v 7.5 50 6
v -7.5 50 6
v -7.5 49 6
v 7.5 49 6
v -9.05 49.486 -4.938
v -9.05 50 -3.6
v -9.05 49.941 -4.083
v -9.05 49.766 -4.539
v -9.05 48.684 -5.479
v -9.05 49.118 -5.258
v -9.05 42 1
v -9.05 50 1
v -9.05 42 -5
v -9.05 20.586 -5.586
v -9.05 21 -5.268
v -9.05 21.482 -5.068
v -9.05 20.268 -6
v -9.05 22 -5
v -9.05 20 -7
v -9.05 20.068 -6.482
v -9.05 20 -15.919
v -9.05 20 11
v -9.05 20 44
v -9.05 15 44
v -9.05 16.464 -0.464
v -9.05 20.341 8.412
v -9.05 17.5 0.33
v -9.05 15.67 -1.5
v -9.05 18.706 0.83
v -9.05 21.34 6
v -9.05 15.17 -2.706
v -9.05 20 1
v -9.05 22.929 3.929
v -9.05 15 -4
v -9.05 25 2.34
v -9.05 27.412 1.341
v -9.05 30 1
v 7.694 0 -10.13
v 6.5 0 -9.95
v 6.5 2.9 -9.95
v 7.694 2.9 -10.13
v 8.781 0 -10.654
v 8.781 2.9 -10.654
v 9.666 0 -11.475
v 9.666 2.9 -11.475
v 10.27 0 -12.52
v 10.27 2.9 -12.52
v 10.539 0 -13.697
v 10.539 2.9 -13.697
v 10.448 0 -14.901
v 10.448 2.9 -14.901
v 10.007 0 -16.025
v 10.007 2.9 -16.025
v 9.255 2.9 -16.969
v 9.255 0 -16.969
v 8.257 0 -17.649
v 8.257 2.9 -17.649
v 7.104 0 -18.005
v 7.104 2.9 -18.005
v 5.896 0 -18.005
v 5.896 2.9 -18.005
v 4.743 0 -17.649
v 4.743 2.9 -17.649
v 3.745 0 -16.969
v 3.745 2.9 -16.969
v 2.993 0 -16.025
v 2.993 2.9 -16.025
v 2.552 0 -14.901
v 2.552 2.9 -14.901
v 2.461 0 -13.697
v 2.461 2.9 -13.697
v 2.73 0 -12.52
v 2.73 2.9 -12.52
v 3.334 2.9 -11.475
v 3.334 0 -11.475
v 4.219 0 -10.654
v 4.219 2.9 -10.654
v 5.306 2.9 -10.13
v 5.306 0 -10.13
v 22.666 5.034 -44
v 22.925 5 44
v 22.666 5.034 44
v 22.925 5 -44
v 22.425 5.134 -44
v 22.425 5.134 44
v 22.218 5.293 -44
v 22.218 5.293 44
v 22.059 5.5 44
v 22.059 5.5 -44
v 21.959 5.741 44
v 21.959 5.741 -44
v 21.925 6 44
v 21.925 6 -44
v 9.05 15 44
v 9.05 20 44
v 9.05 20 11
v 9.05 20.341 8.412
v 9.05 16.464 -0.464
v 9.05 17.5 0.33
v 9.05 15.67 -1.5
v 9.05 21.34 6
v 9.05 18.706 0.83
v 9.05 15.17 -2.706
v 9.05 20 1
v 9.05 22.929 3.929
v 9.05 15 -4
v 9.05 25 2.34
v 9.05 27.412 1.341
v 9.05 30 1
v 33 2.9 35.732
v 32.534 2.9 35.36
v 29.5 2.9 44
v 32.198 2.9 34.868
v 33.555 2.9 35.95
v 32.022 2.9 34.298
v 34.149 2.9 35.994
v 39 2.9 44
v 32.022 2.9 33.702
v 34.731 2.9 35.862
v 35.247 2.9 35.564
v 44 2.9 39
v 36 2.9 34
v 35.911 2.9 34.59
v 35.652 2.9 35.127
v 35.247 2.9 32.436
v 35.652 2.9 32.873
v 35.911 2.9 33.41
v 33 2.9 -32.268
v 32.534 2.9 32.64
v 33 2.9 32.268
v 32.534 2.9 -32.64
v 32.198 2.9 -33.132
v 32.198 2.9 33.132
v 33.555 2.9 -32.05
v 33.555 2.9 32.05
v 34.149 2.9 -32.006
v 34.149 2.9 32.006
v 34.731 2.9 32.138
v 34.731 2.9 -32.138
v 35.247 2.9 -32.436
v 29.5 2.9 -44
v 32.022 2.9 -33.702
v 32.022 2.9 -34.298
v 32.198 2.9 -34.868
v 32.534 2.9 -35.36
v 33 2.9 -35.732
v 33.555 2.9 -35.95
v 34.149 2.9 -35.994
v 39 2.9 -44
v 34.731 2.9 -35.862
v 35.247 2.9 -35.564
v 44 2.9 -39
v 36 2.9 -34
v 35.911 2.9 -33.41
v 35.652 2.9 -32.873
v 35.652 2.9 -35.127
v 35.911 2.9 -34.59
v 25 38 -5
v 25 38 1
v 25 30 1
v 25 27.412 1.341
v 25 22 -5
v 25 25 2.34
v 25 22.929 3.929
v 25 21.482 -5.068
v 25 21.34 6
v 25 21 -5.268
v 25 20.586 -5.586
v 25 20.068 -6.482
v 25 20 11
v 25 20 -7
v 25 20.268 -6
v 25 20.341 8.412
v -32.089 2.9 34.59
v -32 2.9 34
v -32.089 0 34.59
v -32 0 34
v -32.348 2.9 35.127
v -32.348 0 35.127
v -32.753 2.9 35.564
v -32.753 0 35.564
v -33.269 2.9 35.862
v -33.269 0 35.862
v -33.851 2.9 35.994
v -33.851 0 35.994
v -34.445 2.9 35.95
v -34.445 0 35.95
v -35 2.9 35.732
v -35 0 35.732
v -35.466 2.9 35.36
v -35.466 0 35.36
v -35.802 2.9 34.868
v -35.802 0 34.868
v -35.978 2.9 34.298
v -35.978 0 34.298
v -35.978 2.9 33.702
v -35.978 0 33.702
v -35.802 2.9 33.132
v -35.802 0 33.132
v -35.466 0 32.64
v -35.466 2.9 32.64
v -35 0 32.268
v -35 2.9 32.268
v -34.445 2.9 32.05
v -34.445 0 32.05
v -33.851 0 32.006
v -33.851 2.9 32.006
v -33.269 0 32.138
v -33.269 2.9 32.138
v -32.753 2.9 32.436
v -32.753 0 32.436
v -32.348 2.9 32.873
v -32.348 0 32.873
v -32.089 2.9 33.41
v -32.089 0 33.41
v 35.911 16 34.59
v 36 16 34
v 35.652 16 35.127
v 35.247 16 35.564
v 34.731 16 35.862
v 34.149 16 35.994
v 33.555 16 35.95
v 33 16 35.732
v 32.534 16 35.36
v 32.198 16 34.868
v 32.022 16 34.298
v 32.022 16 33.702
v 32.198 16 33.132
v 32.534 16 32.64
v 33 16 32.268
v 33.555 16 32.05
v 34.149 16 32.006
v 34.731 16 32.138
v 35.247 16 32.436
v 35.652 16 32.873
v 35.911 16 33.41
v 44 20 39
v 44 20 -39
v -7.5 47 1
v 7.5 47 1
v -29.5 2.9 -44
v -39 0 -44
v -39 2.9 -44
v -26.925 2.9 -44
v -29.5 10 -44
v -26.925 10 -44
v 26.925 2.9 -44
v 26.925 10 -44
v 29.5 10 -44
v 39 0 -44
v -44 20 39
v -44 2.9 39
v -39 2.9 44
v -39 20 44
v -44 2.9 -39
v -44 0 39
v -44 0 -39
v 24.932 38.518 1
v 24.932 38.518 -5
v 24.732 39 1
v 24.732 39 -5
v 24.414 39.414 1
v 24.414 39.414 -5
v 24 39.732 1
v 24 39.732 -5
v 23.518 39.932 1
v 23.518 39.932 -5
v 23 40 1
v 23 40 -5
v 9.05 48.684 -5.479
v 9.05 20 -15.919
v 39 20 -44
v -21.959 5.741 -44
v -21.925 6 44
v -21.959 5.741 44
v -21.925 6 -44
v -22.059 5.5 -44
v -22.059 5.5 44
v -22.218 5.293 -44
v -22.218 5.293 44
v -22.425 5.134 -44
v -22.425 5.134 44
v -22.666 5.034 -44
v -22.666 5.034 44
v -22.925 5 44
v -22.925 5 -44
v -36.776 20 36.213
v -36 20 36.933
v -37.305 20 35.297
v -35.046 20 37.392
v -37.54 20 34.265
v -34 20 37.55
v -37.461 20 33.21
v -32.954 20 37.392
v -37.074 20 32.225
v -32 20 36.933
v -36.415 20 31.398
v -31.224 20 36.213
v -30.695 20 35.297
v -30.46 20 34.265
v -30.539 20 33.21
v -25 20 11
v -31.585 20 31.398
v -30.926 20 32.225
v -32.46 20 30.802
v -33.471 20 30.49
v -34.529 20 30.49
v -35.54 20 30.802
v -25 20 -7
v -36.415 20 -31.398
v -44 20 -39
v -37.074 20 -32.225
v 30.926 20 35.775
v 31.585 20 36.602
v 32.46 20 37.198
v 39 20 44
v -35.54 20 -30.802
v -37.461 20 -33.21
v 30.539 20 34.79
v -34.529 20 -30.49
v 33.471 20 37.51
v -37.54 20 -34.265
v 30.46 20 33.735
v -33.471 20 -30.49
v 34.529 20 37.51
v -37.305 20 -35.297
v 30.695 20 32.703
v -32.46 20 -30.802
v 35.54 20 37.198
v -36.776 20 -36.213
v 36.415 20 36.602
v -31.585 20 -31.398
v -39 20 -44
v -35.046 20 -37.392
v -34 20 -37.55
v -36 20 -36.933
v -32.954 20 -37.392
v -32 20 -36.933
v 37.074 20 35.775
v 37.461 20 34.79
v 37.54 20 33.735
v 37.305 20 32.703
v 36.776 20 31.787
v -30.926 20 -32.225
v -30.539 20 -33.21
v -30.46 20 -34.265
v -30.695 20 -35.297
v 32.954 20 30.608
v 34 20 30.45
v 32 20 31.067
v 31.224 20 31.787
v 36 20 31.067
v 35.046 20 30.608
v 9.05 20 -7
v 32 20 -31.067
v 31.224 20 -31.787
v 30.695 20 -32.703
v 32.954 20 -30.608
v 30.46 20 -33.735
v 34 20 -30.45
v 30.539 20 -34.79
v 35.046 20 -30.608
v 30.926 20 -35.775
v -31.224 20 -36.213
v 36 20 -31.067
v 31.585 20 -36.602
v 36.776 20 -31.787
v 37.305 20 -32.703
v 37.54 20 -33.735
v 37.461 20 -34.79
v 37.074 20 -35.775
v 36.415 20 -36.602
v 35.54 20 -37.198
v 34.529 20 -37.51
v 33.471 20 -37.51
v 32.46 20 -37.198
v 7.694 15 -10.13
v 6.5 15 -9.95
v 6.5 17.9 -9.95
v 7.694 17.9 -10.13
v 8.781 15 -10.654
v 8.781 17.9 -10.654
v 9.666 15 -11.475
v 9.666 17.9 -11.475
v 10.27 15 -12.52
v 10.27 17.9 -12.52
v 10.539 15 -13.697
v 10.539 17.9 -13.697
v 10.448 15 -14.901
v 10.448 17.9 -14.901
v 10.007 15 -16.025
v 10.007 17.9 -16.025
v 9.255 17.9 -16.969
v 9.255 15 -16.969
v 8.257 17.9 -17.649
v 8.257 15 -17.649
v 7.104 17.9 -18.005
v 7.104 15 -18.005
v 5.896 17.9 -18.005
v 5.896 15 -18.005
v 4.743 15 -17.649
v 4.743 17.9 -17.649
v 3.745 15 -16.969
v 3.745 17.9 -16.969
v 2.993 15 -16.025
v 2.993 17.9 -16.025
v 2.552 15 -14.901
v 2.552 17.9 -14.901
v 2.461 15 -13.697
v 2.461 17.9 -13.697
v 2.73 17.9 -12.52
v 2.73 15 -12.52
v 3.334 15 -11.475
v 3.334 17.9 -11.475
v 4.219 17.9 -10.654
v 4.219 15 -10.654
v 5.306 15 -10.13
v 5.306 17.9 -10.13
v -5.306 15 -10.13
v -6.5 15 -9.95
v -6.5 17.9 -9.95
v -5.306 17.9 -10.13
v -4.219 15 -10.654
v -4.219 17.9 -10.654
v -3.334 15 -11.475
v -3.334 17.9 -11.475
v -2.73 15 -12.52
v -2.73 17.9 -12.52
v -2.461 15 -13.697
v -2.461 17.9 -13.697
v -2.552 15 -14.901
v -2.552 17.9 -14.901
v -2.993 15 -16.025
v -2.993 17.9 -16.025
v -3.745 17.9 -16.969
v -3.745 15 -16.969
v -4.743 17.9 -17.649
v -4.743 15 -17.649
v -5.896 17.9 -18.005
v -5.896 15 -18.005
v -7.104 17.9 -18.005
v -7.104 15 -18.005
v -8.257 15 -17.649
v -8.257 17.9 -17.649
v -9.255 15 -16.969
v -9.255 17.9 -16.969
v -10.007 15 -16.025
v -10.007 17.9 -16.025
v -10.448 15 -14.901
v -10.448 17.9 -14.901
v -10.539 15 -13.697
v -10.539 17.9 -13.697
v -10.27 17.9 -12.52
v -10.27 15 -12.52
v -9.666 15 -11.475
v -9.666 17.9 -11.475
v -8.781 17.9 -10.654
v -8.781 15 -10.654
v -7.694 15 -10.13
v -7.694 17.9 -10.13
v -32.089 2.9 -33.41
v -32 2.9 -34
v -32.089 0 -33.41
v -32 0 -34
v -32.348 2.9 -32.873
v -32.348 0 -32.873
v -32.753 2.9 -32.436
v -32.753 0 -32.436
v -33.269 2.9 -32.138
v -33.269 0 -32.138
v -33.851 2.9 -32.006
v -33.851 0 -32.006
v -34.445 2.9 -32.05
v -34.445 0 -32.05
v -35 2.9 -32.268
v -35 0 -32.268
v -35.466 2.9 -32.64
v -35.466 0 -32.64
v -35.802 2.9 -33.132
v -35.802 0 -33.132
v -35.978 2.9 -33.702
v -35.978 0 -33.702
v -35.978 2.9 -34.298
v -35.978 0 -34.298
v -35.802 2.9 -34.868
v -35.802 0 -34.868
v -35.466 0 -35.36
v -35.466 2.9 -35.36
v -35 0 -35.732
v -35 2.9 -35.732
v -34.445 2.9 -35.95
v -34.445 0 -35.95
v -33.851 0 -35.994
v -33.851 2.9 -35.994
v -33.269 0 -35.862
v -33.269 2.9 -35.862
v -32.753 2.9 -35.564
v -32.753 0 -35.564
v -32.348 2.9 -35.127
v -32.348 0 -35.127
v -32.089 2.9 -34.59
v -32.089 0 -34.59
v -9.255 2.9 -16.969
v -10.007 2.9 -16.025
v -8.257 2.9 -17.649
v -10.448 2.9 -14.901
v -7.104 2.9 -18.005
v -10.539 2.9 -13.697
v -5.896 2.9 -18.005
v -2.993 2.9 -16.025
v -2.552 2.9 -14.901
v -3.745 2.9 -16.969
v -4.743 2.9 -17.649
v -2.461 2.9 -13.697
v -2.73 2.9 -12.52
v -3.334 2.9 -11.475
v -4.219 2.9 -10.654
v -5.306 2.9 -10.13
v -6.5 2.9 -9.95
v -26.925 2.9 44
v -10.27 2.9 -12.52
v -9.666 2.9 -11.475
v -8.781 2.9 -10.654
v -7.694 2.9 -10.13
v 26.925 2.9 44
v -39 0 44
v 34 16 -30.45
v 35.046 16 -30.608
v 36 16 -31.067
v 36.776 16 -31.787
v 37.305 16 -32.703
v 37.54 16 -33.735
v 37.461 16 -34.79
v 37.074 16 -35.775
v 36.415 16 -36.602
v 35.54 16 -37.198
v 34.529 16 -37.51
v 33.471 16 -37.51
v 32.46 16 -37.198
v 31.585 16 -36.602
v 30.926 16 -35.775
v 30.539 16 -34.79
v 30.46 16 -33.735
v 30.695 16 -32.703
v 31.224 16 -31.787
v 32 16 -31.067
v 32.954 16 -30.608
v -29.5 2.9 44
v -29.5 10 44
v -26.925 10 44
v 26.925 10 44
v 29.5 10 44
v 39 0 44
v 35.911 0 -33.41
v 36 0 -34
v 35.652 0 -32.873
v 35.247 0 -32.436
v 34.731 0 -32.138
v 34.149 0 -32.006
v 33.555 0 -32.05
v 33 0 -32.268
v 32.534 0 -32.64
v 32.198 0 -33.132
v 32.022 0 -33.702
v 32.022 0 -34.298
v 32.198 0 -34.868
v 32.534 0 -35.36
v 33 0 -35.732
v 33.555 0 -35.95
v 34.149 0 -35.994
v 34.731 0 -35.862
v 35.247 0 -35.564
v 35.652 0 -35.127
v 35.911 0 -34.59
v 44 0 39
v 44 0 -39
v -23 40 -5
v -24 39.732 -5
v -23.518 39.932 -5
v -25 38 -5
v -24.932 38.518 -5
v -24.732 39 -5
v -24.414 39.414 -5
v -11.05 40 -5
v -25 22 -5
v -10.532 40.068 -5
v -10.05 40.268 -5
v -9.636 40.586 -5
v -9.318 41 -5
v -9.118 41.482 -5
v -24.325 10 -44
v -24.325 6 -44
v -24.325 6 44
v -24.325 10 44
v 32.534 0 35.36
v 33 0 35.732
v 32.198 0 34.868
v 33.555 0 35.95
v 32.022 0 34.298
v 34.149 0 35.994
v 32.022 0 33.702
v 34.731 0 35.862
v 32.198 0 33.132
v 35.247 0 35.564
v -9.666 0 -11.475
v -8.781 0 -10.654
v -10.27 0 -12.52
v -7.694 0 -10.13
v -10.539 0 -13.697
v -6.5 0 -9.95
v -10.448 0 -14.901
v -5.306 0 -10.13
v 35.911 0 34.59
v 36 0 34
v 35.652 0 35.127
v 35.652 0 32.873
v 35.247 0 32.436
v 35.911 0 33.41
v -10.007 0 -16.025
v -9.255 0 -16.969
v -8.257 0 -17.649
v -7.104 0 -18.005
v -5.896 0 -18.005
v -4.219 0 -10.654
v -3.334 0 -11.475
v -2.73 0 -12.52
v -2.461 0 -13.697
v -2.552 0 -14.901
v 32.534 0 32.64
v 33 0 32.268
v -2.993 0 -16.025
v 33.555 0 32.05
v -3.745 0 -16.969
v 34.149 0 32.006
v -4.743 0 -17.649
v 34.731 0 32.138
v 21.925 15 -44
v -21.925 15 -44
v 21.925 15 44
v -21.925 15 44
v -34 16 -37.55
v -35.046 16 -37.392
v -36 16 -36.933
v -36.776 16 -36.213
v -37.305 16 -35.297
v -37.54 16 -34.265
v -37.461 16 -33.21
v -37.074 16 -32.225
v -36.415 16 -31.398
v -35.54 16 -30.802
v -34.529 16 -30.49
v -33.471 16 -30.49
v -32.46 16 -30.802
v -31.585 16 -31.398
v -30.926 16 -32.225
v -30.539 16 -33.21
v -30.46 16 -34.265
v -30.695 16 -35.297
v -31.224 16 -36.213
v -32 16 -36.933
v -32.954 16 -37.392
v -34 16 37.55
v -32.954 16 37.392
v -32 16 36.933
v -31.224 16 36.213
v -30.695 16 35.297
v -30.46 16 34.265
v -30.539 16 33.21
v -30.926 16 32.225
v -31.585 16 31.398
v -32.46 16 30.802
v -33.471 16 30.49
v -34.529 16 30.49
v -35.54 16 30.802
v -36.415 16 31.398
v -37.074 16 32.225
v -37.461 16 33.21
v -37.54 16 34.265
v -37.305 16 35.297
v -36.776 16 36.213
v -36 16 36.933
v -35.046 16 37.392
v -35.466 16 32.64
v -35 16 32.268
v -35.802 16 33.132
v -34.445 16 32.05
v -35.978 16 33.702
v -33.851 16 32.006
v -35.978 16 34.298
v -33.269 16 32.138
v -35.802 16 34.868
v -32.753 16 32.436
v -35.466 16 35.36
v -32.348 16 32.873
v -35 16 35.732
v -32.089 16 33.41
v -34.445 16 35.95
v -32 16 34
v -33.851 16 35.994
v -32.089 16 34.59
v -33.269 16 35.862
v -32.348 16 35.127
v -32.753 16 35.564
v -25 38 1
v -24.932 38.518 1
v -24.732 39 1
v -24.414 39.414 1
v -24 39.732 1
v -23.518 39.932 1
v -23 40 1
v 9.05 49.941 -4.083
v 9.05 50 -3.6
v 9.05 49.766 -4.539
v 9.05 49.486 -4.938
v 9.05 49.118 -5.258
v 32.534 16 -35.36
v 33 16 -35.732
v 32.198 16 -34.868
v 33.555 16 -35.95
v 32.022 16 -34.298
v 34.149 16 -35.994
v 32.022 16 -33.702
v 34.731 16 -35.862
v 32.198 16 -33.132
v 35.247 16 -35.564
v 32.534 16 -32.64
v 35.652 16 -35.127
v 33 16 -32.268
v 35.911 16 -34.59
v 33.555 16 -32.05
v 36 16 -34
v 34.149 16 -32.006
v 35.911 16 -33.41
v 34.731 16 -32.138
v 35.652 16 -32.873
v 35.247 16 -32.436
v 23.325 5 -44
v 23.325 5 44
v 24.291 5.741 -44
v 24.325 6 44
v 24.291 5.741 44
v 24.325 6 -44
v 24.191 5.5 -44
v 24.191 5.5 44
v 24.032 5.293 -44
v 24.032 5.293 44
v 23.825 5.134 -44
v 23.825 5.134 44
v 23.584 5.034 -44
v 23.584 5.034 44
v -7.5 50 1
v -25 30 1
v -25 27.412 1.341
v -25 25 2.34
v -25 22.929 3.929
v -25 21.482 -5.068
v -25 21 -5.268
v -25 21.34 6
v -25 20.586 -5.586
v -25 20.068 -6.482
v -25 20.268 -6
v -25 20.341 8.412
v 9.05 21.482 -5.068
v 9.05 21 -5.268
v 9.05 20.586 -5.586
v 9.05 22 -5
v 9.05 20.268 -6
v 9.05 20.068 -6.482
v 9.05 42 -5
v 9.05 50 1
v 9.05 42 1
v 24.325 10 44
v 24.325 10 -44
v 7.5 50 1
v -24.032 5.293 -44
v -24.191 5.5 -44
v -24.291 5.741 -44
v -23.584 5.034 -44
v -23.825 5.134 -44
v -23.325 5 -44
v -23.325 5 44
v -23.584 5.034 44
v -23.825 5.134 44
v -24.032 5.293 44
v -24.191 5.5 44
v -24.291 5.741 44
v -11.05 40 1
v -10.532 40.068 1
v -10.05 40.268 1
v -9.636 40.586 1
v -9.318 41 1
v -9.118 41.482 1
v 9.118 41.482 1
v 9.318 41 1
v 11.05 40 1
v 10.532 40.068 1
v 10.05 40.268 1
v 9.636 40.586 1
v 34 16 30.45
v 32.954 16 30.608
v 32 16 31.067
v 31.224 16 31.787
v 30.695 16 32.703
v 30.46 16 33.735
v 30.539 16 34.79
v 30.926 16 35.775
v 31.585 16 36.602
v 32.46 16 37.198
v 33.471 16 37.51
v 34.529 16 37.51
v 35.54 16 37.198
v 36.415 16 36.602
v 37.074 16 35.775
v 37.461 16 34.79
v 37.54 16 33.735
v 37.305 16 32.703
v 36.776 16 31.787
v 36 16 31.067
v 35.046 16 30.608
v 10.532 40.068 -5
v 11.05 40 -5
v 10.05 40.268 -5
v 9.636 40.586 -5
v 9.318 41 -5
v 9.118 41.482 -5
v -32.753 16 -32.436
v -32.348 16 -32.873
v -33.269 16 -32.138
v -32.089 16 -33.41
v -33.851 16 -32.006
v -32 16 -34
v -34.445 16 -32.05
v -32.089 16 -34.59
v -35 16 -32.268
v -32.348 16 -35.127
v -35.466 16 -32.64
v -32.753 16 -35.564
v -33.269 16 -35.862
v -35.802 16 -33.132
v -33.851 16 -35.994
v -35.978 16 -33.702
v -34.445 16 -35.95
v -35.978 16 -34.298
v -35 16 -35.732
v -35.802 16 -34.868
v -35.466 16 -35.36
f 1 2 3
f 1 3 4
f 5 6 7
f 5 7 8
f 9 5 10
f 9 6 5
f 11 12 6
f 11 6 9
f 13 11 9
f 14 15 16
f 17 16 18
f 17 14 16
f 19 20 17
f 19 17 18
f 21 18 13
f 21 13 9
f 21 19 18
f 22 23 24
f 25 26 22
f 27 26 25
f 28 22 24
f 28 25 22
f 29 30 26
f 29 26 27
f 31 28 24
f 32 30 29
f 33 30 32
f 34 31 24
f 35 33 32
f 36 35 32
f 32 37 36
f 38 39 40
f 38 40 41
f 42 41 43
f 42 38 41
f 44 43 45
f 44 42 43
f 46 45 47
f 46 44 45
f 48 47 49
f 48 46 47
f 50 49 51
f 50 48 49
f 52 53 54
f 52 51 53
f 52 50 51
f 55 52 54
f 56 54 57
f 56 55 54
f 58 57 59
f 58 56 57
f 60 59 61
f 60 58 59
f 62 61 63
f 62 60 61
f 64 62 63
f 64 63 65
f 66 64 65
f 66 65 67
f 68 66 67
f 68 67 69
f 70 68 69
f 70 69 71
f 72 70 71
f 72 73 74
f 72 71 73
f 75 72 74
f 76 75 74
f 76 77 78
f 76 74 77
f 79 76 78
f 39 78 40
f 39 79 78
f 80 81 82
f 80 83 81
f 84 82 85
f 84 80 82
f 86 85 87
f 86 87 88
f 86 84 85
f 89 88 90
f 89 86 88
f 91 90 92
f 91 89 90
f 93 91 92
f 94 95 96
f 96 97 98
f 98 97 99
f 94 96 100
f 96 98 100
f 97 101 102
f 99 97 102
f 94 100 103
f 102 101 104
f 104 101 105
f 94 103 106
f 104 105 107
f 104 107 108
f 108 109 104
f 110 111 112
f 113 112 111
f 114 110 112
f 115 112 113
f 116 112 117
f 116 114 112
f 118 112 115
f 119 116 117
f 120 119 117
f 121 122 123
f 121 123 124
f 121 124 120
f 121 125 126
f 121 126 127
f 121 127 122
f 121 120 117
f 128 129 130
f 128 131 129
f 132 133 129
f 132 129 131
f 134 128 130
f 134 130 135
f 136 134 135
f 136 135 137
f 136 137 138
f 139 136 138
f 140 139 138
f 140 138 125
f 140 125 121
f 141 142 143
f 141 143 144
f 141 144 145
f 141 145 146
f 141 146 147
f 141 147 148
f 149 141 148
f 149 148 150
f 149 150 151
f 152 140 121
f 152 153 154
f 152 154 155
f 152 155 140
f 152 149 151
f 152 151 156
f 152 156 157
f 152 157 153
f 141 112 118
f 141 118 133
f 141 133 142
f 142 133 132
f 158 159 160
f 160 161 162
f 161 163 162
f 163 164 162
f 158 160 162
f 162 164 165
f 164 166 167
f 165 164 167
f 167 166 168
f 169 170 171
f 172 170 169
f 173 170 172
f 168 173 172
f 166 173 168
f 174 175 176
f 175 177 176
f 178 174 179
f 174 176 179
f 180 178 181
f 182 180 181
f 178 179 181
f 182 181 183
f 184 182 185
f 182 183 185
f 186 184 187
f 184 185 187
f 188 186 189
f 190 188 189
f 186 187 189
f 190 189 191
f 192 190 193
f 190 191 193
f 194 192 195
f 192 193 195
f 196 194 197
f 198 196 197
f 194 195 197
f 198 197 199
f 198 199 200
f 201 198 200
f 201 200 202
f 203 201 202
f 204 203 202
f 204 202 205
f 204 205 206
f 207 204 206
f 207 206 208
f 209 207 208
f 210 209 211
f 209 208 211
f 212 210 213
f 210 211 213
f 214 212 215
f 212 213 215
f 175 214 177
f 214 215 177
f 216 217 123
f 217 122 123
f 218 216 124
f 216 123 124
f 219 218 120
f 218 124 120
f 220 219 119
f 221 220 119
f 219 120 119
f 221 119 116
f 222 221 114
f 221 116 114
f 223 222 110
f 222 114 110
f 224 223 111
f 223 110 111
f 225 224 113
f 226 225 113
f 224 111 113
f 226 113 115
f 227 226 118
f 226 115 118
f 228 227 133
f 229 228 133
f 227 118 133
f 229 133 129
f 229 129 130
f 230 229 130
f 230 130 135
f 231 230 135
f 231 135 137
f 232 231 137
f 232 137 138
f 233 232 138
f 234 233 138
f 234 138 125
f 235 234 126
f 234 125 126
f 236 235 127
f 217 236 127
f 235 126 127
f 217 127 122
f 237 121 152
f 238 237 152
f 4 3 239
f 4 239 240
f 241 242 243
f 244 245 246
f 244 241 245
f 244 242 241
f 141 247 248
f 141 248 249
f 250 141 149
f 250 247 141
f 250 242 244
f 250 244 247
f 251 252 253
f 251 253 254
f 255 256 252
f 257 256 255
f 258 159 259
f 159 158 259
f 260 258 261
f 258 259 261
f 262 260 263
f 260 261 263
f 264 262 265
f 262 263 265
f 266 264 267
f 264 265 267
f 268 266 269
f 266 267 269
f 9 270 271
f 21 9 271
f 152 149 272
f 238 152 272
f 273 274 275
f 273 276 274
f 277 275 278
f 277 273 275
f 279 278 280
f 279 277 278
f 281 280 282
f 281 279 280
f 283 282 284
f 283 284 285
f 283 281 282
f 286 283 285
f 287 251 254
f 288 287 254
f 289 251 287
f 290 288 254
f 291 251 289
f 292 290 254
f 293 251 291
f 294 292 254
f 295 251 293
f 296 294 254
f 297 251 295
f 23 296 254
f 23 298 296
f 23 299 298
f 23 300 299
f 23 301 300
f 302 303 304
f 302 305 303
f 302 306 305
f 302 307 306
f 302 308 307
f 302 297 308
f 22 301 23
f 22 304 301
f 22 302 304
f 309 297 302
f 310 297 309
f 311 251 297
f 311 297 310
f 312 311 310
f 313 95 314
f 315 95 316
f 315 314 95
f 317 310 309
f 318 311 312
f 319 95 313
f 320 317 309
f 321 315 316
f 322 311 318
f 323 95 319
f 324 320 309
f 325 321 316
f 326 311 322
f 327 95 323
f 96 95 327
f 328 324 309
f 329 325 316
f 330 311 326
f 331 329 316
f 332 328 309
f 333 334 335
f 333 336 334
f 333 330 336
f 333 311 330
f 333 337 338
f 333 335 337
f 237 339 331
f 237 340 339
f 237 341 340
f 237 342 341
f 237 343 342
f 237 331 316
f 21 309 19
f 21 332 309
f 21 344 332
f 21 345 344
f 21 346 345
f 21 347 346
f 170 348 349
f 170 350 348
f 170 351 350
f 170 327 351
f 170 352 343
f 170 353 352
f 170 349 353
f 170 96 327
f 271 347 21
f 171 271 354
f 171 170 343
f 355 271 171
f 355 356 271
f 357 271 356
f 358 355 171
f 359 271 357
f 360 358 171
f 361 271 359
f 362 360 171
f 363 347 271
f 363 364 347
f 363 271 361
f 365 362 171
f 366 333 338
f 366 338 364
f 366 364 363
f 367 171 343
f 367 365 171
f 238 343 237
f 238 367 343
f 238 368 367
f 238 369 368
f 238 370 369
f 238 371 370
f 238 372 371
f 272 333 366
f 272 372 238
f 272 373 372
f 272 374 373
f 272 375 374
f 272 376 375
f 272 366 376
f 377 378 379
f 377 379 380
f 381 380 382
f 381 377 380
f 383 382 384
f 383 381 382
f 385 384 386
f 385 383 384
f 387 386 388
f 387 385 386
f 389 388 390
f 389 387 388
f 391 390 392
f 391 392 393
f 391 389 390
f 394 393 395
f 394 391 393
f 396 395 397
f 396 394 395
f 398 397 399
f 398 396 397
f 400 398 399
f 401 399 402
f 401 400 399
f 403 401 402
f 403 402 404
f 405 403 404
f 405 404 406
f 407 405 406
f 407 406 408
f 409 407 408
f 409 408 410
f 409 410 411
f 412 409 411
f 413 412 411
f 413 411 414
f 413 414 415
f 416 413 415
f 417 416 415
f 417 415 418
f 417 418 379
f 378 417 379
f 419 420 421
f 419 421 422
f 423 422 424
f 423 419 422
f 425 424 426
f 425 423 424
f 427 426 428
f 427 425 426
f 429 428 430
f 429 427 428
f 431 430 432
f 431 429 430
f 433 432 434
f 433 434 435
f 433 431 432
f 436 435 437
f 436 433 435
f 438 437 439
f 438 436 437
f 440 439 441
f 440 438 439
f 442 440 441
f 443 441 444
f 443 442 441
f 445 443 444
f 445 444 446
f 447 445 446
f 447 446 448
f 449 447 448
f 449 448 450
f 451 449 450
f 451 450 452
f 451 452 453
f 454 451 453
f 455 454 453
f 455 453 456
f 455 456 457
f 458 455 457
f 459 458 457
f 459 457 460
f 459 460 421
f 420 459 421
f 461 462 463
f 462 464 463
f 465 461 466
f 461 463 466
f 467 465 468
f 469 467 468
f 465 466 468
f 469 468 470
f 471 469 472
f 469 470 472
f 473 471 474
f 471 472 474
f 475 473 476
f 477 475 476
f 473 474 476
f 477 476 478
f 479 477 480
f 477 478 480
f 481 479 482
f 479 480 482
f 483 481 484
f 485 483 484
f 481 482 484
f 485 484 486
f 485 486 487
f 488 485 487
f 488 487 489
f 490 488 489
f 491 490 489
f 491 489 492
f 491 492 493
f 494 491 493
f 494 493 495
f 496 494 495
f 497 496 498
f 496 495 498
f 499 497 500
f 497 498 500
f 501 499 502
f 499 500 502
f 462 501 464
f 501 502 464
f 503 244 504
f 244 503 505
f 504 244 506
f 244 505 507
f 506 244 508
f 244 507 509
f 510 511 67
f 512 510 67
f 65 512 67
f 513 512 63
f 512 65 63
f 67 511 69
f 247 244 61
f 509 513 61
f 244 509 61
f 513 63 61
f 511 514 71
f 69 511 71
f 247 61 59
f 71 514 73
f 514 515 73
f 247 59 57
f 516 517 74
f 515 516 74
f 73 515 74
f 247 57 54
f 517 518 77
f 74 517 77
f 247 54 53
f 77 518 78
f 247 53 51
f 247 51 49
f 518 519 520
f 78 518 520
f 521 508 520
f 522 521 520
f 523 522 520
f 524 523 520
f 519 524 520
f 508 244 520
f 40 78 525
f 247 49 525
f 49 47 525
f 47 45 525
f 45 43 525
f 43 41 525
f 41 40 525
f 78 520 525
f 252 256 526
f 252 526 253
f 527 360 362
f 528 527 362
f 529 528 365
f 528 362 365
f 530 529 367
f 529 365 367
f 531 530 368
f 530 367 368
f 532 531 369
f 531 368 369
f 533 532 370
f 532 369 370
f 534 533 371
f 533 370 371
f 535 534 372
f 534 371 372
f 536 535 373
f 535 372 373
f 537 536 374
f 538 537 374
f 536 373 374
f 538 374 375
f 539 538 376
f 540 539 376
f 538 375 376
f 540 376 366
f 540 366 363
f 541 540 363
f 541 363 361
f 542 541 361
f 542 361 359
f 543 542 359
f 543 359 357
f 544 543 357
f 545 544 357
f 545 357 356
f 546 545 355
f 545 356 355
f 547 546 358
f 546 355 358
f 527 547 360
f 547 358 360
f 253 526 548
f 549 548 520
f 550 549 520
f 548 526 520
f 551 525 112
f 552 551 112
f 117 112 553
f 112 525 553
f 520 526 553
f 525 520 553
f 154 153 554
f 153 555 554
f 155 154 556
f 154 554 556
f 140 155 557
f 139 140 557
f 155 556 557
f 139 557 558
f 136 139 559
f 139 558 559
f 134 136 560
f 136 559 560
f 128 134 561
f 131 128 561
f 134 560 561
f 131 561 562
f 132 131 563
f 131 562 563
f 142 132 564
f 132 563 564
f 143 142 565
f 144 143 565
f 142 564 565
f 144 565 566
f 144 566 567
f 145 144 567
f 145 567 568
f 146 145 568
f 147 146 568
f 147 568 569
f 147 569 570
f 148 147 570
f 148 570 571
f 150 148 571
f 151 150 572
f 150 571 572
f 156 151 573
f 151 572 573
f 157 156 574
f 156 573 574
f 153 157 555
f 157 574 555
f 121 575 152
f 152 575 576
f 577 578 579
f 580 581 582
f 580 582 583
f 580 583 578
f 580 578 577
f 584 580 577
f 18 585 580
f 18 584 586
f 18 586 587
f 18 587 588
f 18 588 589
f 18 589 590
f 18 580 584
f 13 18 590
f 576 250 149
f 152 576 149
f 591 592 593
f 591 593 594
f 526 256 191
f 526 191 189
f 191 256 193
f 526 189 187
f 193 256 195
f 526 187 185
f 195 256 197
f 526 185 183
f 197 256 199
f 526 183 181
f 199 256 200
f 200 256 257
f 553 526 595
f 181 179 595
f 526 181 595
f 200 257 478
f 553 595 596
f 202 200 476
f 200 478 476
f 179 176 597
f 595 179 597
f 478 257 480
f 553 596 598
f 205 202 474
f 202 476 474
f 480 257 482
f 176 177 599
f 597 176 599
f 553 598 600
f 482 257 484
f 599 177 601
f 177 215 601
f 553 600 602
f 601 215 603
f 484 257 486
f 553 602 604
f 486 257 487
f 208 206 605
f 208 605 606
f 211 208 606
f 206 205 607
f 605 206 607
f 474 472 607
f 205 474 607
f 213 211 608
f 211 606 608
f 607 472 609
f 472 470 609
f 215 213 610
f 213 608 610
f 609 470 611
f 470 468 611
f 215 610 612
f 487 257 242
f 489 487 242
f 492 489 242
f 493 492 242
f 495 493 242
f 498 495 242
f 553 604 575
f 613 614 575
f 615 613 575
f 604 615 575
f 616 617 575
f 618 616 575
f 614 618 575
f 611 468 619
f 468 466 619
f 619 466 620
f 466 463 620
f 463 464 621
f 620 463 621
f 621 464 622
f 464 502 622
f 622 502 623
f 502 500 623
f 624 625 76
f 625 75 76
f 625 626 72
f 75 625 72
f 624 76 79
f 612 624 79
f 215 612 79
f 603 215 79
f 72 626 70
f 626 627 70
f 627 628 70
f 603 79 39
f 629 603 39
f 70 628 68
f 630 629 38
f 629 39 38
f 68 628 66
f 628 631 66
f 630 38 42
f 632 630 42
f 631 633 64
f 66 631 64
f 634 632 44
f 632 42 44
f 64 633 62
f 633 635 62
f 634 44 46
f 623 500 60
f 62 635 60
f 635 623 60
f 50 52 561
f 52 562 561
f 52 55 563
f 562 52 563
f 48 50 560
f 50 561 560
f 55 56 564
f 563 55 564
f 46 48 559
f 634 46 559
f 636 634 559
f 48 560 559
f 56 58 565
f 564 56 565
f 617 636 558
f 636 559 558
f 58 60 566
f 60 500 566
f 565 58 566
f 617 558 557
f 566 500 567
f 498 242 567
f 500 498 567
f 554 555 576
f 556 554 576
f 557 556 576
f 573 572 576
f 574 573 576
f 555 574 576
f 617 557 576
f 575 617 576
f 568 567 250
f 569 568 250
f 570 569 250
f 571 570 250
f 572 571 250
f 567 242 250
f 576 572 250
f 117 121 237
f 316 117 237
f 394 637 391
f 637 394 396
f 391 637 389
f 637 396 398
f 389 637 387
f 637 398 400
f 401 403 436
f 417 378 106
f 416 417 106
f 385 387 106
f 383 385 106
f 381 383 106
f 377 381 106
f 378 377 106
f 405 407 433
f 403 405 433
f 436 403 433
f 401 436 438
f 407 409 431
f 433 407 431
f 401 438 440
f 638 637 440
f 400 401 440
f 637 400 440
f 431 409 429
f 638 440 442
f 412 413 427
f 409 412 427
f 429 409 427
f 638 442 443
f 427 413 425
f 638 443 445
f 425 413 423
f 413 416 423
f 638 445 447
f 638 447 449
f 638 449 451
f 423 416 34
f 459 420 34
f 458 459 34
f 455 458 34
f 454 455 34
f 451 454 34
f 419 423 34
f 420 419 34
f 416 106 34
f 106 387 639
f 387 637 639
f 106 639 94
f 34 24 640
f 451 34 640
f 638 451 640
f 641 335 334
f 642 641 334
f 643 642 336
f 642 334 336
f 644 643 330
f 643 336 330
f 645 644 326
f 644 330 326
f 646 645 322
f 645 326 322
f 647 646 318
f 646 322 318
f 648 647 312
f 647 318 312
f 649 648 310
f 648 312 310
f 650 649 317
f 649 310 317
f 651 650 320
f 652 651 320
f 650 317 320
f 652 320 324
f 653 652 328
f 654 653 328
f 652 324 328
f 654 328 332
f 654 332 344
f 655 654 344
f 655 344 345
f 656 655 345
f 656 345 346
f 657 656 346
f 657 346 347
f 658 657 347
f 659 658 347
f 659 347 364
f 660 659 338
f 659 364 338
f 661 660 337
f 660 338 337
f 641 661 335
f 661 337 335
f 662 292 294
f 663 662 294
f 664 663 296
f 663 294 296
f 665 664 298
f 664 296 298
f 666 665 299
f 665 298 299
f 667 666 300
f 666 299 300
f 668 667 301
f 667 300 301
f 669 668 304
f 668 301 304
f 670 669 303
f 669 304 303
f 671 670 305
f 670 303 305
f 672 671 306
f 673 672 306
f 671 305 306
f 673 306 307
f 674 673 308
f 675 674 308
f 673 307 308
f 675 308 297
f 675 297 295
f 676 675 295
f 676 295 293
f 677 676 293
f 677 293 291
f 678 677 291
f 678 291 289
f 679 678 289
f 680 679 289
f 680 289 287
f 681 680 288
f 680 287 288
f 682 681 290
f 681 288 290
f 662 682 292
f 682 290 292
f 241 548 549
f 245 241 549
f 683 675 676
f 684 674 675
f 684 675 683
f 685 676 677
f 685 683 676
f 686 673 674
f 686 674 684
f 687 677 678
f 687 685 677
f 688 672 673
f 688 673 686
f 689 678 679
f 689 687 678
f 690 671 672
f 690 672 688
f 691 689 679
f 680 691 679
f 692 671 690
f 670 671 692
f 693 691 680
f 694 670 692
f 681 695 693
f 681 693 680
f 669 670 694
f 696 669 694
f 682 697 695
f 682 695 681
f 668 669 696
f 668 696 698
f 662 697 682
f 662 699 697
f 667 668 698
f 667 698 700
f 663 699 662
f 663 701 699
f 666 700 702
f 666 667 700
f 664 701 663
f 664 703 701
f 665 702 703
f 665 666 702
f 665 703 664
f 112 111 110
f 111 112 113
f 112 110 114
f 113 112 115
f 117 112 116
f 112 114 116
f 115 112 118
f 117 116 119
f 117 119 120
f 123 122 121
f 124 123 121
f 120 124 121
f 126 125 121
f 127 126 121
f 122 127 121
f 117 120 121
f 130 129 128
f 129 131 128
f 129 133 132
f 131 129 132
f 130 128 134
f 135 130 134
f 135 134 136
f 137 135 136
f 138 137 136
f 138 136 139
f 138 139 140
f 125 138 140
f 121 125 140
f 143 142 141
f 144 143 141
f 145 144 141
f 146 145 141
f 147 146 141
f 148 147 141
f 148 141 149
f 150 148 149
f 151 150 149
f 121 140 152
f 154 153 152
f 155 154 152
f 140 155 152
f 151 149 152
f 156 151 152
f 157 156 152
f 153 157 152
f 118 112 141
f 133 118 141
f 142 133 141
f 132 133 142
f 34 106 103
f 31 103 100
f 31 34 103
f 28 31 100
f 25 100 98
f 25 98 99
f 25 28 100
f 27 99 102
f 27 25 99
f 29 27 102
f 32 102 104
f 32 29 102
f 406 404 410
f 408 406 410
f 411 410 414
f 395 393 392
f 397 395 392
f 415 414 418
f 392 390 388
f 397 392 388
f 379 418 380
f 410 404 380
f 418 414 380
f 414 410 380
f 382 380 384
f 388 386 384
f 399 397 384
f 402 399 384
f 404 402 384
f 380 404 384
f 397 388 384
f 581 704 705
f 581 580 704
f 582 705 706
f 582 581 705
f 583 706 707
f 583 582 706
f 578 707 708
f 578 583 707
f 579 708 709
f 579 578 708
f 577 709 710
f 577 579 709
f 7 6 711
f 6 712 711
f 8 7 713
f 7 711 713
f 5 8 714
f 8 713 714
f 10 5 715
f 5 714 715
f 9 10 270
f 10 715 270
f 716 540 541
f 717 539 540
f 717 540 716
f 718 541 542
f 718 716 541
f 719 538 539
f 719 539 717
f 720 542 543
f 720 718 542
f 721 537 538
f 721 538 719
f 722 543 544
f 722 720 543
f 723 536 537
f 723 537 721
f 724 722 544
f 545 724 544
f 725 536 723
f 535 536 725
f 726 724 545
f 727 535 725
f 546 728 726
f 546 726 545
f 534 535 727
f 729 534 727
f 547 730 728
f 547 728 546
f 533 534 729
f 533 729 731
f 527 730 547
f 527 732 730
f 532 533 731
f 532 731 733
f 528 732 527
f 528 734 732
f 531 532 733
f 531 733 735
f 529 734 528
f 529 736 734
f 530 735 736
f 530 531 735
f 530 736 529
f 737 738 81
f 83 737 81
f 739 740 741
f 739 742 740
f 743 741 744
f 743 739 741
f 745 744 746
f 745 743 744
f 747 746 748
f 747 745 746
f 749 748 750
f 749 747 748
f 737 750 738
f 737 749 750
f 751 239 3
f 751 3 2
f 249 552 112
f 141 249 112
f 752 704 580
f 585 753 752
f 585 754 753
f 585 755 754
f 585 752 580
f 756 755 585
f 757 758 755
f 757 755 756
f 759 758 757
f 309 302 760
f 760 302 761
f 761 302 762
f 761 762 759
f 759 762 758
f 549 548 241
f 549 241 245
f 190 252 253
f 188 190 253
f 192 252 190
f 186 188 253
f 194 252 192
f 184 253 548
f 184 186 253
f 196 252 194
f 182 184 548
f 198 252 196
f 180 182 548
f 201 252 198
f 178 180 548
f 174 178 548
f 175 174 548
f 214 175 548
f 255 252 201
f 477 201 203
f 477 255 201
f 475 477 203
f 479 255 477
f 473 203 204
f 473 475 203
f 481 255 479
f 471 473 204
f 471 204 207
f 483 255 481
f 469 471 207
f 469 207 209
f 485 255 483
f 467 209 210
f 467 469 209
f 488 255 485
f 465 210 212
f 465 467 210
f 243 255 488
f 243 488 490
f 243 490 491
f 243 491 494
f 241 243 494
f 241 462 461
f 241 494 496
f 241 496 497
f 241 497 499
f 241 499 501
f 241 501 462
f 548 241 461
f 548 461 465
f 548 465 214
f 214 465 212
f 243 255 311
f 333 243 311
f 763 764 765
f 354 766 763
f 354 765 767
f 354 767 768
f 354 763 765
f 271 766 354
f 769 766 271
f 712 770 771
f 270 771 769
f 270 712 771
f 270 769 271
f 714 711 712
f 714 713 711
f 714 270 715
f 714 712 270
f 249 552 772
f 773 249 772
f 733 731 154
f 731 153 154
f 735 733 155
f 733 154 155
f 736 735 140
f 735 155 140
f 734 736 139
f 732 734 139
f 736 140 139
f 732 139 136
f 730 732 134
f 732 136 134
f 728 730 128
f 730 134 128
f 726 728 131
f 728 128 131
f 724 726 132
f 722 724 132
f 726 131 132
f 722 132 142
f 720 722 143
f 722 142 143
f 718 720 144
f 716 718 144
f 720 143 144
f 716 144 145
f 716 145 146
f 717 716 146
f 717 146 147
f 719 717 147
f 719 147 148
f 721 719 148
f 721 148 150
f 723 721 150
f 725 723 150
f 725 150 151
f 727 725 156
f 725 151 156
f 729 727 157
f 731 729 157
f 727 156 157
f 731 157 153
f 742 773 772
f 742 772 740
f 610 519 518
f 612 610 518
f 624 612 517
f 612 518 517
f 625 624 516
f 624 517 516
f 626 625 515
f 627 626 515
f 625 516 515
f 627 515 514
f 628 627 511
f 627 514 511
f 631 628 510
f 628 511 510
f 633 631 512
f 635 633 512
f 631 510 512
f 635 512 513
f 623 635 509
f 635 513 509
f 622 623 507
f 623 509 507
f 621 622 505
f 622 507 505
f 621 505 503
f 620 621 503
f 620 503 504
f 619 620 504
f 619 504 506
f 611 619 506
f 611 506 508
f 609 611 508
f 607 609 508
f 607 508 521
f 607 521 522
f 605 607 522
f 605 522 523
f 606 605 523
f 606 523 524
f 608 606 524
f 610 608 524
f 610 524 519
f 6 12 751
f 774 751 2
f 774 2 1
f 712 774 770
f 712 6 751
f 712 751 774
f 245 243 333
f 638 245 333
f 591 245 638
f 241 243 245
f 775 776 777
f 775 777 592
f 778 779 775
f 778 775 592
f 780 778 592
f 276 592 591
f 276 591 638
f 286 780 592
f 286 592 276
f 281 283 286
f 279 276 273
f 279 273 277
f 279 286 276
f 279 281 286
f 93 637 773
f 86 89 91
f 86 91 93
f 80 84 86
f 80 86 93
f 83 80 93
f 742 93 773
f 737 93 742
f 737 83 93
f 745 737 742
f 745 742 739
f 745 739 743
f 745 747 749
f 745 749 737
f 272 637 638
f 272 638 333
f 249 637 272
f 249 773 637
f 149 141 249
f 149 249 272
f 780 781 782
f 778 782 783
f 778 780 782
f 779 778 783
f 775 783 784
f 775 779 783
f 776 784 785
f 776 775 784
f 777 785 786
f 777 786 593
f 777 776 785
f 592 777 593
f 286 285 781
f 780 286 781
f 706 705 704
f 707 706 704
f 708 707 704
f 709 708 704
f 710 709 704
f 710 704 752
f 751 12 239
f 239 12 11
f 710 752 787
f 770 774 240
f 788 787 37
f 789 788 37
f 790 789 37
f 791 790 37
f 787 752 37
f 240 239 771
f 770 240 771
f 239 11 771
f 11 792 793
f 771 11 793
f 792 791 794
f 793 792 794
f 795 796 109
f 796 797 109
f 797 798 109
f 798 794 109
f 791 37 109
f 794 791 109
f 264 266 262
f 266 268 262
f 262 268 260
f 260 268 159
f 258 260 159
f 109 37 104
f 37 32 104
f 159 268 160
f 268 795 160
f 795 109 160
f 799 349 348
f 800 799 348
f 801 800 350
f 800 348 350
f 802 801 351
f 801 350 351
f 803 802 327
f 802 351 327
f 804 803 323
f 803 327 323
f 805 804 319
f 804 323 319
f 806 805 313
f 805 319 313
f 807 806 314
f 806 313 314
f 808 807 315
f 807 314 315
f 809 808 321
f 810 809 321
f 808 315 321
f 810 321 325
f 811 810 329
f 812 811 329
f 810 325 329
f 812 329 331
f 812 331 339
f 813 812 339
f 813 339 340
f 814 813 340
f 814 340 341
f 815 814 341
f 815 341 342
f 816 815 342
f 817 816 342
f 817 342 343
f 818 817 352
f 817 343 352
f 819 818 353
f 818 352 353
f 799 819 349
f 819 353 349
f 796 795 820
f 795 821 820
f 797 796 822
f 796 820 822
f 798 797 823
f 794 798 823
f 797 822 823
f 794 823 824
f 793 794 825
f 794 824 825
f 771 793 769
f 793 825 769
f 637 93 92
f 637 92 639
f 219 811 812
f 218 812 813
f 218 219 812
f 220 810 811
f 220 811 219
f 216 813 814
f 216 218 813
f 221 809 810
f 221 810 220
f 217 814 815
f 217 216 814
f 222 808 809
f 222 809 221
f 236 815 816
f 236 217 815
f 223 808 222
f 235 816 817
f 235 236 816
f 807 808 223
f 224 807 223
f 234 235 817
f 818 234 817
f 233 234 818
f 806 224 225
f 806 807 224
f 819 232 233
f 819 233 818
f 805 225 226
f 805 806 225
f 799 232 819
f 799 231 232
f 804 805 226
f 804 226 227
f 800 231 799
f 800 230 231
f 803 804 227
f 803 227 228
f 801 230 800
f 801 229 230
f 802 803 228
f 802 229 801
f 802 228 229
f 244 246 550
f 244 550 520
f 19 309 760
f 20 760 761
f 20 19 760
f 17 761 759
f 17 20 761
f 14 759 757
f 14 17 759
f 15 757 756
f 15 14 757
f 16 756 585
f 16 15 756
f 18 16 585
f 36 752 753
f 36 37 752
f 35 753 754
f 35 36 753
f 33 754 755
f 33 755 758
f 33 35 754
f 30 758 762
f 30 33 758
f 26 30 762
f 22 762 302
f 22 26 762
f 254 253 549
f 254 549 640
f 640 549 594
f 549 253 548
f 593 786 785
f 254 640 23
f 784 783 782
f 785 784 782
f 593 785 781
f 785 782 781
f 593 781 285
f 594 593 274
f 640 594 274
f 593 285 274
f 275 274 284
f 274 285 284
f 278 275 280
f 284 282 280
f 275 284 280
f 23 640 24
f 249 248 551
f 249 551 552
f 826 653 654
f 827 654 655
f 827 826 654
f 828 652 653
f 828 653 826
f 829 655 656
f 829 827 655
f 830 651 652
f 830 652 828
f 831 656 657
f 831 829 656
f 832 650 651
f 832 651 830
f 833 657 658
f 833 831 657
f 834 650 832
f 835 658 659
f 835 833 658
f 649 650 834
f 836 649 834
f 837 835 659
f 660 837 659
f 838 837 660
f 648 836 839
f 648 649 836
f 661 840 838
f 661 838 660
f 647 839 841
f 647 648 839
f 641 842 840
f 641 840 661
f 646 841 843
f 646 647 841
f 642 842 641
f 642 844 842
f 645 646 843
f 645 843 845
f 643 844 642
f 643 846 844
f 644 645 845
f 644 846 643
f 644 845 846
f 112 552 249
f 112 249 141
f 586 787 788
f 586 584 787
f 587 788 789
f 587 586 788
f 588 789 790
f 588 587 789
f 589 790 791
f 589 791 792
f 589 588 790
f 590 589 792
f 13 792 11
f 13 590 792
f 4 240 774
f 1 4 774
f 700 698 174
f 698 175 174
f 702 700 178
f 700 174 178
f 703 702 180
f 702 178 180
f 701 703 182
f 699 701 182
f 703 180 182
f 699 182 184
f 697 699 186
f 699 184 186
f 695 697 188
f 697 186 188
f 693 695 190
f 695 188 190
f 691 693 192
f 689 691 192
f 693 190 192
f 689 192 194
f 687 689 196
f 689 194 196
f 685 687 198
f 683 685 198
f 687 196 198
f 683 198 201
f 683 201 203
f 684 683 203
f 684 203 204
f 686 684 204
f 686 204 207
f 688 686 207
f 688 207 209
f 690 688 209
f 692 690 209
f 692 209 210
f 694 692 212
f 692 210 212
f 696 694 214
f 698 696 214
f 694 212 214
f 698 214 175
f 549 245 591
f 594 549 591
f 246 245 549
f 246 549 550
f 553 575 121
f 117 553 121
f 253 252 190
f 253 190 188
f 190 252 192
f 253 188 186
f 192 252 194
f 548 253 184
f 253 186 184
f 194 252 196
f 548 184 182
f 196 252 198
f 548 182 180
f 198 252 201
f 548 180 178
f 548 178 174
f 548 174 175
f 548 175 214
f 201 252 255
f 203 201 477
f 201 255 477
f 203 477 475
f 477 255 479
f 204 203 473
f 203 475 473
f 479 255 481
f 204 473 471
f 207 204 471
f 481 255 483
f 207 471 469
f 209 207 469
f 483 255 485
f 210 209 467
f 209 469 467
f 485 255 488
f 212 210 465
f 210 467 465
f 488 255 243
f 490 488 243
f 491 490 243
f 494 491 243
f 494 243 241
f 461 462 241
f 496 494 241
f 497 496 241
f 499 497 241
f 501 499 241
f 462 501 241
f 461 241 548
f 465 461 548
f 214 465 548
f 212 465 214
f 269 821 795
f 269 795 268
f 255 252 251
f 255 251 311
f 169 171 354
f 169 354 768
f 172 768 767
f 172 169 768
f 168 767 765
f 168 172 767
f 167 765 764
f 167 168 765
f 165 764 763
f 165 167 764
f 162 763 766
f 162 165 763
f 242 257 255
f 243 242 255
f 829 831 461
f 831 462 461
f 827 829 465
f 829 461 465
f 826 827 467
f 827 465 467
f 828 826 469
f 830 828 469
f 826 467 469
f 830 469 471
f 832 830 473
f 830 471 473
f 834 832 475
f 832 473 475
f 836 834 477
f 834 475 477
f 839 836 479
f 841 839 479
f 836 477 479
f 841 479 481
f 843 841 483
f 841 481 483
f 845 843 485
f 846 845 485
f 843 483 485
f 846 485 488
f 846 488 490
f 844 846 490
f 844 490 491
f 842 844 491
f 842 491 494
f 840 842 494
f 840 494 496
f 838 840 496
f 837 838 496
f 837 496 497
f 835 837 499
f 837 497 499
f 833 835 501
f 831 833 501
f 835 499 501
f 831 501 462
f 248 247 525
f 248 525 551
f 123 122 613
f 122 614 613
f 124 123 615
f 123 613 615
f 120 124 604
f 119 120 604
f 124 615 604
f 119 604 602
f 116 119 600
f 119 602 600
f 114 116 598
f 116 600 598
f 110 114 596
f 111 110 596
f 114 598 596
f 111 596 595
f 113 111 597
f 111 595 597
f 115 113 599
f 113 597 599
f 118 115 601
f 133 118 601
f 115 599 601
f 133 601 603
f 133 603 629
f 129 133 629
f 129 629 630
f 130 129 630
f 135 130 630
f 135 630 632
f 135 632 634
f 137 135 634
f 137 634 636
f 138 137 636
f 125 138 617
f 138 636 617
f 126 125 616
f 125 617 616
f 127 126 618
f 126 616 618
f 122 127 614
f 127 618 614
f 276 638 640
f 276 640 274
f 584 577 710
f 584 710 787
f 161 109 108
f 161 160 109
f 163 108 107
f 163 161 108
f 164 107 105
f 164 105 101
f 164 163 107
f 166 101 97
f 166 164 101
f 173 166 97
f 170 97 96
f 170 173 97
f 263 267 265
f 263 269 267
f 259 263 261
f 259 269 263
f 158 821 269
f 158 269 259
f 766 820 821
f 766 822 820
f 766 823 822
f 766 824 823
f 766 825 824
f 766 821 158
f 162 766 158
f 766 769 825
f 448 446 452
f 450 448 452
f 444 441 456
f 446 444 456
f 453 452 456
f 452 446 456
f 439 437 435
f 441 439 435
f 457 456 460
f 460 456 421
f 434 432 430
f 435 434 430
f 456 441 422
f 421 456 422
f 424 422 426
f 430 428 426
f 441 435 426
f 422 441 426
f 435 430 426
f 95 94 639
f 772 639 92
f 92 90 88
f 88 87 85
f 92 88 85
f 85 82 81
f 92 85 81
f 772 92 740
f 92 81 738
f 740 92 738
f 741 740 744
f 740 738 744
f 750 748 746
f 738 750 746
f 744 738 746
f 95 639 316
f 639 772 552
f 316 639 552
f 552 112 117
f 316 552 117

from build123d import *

# Parameters (mm, degrees)
SCHIZZO2_W                      = 88
SCHIZZO2_H                      = 88
ESTRUSIONE_ESTRUSIONE1_DEPTH    = 20
CUT_EXTRUDE1_DEPTH              = 101.399203184
CUT_EXTRUDE2_REACH              = 67.361
SKETCH2_W                       = 18.1
SKETCH2_H                       = 74
CUT_EXTRUDE3_REACH              = 66.532
SKETCH3_R                       = 4.05
CUT_EXTRUDE3_DIRECTION_2_DEPTH  = 15
CUT_EXTRUDE4_DEPTH              = 15
CUT_EXTRUDE4_DEPTH_BACK         = 3
SKETCH9_R                       = 4.05
SKETCH4_W                       = 50
SKETCH4_H                       = 6
BOSS_EXTRUDE1_DEPTH             = 20
SKETCH5_W                       = 18.1
SKETCH5_H                       = 6
BOSS_EXTRUDE2_DEPTH             = 10
FILLET1_R                       = 10
F_4_0_4_DIAMETER_HOLE1_D        = 4
SKETCH12_R                      = 3.55
CUT_EXTRUDE5_DEPTH              = 4
SMUSSO1_SIZE                    = 5
RACCORDO2_R                     = 2
FILLET2_R                       = 1
BOSS_EXTRUDE3_REACH             = 81.825
BOSS_EXTRUDE3_DIRECTION_2_REACH = 81.825
FILLET3_R                       = 5
FILLET4_R                       = 2
SKETCH14_W                      = 15
SKETCH14_H                      = 3
BOSS_EXTRUDE4_DEPTH             = 5
CHAMFER1_SIZE2                  = 2
CHAMFER1_SIZE                   = 5
SPLIT1_SURFACE_1_BACK           = 135.119
SPLIT1_SURFACE_1_DEPTH          = 270.238
SPLIT1_SURFACE_2_BACK           = 135.119
SPLIT1_SURFACE_2_DEPTH          = 270.238


with BuildPart() as part:
    # Schizzo2 → Estrusione-Estrusione1 (new body)
    with BuildSketch(Plane(origin=(0, 0, 0), x_dir=(1, 0, 0), z_dir=(0, 1, 0))):
        Rectangle(SCHIZZO2_W, SCHIZZO2_H)
    extrude(amount=ESTRUSIONE_ESTRUSIONE1_DEPTH)

    # Sketch1 → Cut-Extrude1 (cut, through all)
    with BuildSketch(Plane.XY.offset(44)):
        Polygon((-26.925, 2.9), (26.925, 2.9), (26.925, 10), (24.325, 10), (24.325, 5), (21.925, 5), (21.925, 15), (-21.925, 15), (-21.925, 5), (-24.325, 5), (-24.325, 10), (-26.925, 10), align=None)
    extrude(amount=-CUT_EXTRUDE1_DEPTH, mode=Mode.SUBTRACT)

    # Sketch2 → Cut-Extrude2 (cut, up to next)
    with BuildSketch(Plane(origin=(0, 20, 0), x_dir=(1, 0, 0), z_dir=(0, 1, 0)), mode=Mode.PRIVATE) as cut_extrude2_sk1:
        with Locations((0, -38)):
            Rectangle(SKETCH2_W, SKETCH2_H)
    cut_extrude2_tool1 = extrude(cut_extrude2_sk1.sketch, amount=-CUT_EXTRUDE2_REACH, mode=Mode.PRIVATE) & part.part
    add(cut_extrude2_tool1.solids().sort_by_distance((0, 20, 38))[0], mode=Mode.SUBTRACT)

    # Sketch3 → Cut-Extrude3 (cut, up to next)
    with BuildSketch(Plane(origin=(0, 2.9, 0), x_dir=(1, 0, 0), z_dir=(0, 1, 0)), mode=Mode.PRIVATE) as cut_extrude3_sk1:
        with Locations(Location((-6.5, 14, 0), (0, 0, 270))):
            Circle(SKETCH3_R)
    cut_extrude3_tool1 = extrude(cut_extrude3_sk1.sketch, amount=-CUT_EXTRUDE3_REACH, mode=Mode.PRIVATE) & part.part
    add(cut_extrude3_tool1.solids().sort_by_distance((-6.5, 2.9, -14))[0], mode=Mode.SUBTRACT)

    # Sketch3 → Cut-Extrude3 direction 2 (cut)
    with BuildSketch(Plane(origin=(0, 2.9, 0), x_dir=(1, 0, 0), z_dir=(0, 1, 0))):
        with Locations(Location((-6.5, 14, 0), (0, 0, 270))):
            Circle(SKETCH3_R)
    extrude(amount=CUT_EXTRUDE3_DIRECTION_2_DEPTH, mode=Mode.SUBTRACT)

    # Sketch9 → Cut-Extrude4 (cut, two sides: drawn at the far end of the back side and taken through both)
    with BuildSketch(Plane(origin=(0, 2.9, 0), x_dir=(1, 0, 0), z_dir=(0, 1, 0)).offset(-CUT_EXTRUDE4_DEPTH_BACK)):
        with Locations(Location((6.5, 14, 0), (0, 0, 270))):
            Circle(SKETCH9_R)
    extrude(amount=CUT_EXTRUDE4_DEPTH + CUT_EXTRUDE4_DEPTH_BACK, mode=Mode.SUBTRACT)

    # Sketch4 → Boss-Extrude1 (add)
    with BuildSketch(Plane(origin=(0, 20, 0), x_dir=(1, 0, 0), z_dir=(0, 1, 0))):
        with Locations((0, 2)):
            Rectangle(SKETCH4_W, SKETCH4_H)
    extrude(amount=BOSS_EXTRUDE1_DEPTH)

    # Sketch5 → Boss-Extrude2 (add)
    with BuildSketch(Plane(origin=(0, 40, 0), x_dir=(1, 0, 0), z_dir=(0, 1, 0))):
        with Locations((0, 2)):
            Rectangle(SKETCH5_W, SKETCH5_H)
    extrude(amount=BOSS_EXTRUDE2_DEPTH)

    # Fillet1
    fillet1_edges = [part.edges().sort_by_distance(p)[0] for p in [
        (17.025, 20, 1),
        (-17.025, 20, 1),
    ]]
    fillet(fillet1_edges, radius=FILLET1_R)

    # Ø4.0 (4) Diameter Hole1 (through all)
    with Locations(Plane(origin=(0, 20, 0), x_dir=(-1, 0, 0), z_dir=(0, 1, 0))):
        with Locations((-34, -34), (-34, 34), (34, 34), (34, -34)):
            Hole(F_4_0_4_DIAMETER_HOLE1_D / 2)

    # Sketch12 → Cut-Extrude5 (cut)
    with BuildSketch(Plane(origin=(0, 20, 0), x_dir=(1, 0, 0), z_dir=(0, 1, 0))):
        with Locations(Location((34, 34, 0), (0, 0, 270))):
            Circle(SKETCH12_R)
        with Locations(Location((-34, 34, 0), (0, 0, 90))):
            Circle(SKETCH12_R)
        with Locations(Location((-34, -34, 0), (0, 0, 270))):
            Circle(SKETCH12_R)
        with Locations(Location((34, -34, 0), (0, 0, 90))):
            Circle(SKETCH12_R)
    extrude(amount=-CUT_EXTRUDE5_DEPTH, mode=Mode.SUBTRACT)

    # Smusso1
    smusso1_edges = [part.edges().sort_by_distance(p)[0] for p in [
        (44, 10, 44),
        (-44, 10, 44),
        (-44, 10, -44),
        (44, 10, -44),
    ]]
    chamfer(smusso1_edges, length=SMUSSO1_SIZE)

    # Raccordo2
    raccordo2_edges = [part.edges().sort_by_distance(p)[0] for p in [
        (-9.05, 40, -2),
        (9.05, 40, -2),
        (0, 20, -5),
        (-25, 40, -2),
        (25, 40, -2),
    ]]
    fillet(raccordo2_edges, radius=RACCORDO2_R)

    # Fillet2
    fillet2_edges = [part.edges().sort_by_distance(p)[0] for p in [
        (-24.325, 5, 0),
        (-21.925, 5, 0),
        (21.925, 5, 0),
        (24.325, 5, 0),
    ]]
    fillet(fillet2_edges, radius=FILLET2_R)

    # Boss-Extrude3: up to this face of the body (flat: up to its plane)
    boss_extrude3_end = Plane(part.part.faces().sort_by_distance((9.05, 46, -2))[0])
    # Sketch13 → Boss-Extrude3 (add, up to the picked face)
    with BuildSketch(Plane(origin=(0, 0, 0), x_dir=(0, 0, -1), z_dir=(1, 0, 0)), mode=Mode.PRIVATE) as boss_extrude3_sk1:
        Polygon((5, 50), (15.919107028, 20), (5, 20), align=None)
    boss_extrude3_tool1 = split(extrude(boss_extrude3_sk1.sketch, amount=BOSS_EXTRUDE3_REACH, mode=Mode.PRIVATE), bisect_by=boss_extrude3_end, keep=Keep.BOTH, mode=Mode.PRIVATE)
    add(boss_extrude3_tool1.solids().sort_by(Axis((0, 30, -8.639702), (1, 0, 0)))[0])

    # Boss-Extrude3 direction 2: up to this face of the body (flat: up to its plane)
    boss_extrude3_direction_2_end = Plane(part.part.faces().sort_by_distance((-9.05, 46, -2))[0])
    # Sketch13 → Boss-Extrude3 direction 2 (add, up to the picked face)
    with BuildSketch(Plane(origin=(0, 0, 0), x_dir=(0, 0, -1), z_dir=(1, 0, 0)), mode=Mode.PRIVATE) as boss_extrude3_direction_2_sk1:
        Polygon((5, 50), (15.919107028, 20), (5, 20), align=None)
    boss_extrude3_direction_2_tool1 = split(extrude(boss_extrude3_direction_2_sk1.sketch, amount=-BOSS_EXTRUDE3_DIRECTION_2_REACH, mode=Mode.PRIVATE), bisect_by=boss_extrude3_direction_2_end, keep=Keep.BOTH, mode=Mode.PRIVATE)
    add(boss_extrude3_direction_2_tool1.solids().sort_by(Axis((0, 30, -8.639702), (-1, 0, 0)))[0])

    # Fillet3
    fillet3_edges = [part.edges().sort_by_distance(p)[0] for p in [
        (0, 15, 1),
    ]]
    fillet(fillet3_edges, radius=FILLET3_R)

    # Fillet4
    fillet4_edges = [part.edges().sort_by_distance(p)[0] for p in [
        (0, 50, -5),
    ]]
    fillet(fillet4_edges, radius=FILLET4_R)

    # Sketch14 → Boss-Extrude4 (add)
    with BuildSketch(Plane.XY.offset(1)):
        with Locations((0, 48.5)):
            Rectangle(SKETCH14_W, SKETCH14_H)
    extrude(amount=BOSS_EXTRUDE4_DEPTH)

    # Chamfer1
    chamfer1_edges = [part.edges().sort_by_distance(p)[0] for p in [
        (0, 47, 6),
    ]]
    chamfer1_side = [part.faces().sort_by_distance(p)[0] for p in [
        (0, 47, 5.96),
    ]]
    chamfer(chamfer1_edges, length=CHAMFER1_SIZE - 0.0001, length2=CHAMFER1_SIZE2 - 0.0001, reference=chamfer1_side[0])  # a hair under: the kernel refuses the full size


with BuildPart() as body_2:
    # Split1: the piece behind the surface
    add(part.part)
    # Split1 surface: a surface, the sketch's curves swept straight by 270.238 mm
    with BuildLine(Plane.XY.offset(44).offset(-SPLIT1_SURFACE_1_BACK), mode=Mode.PRIVATE) as split1_surface_1_path:
        Line((-44, 2.9), (-29.5, 2.9))
        Line((-29.5, 2.9), (-29.5, 10))
        Line((-29.5, 10), (-24.325, 10))
        Line((-24.325, 10), (-24.325, 5))
        Line((-24.325, 5), (24.325, 5))
        Line((24.325, 5), (24.325, 10))
        Line((24.325, 10), (29.5, 10))
        Line((29.5, 10), (29.5, 2.9))
        Line((29.5, 2.9), (44, 2.9))
    split1_surface_1 = Shell.extrude(split1_surface_1_path.wire(), (0 * SPLIT1_SURFACE_1_DEPTH, 0 * SPLIT1_SURFACE_1_DEPTH, 1 * SPLIT1_SURFACE_1_DEPTH))
    split(bisect_by=split1_surface_1, keep=Keep.BOTTOM)


with BuildPart() as part_1:
    add(part.part)

    # Split1: split by a surface, the side it looks to stays
    # Split1 surface: a surface, the sketch's curves swept straight by 270.238 mm
    with BuildLine(Plane.XY.offset(44).offset(-SPLIT1_SURFACE_2_BACK), mode=Mode.PRIVATE) as split1_surface_2_path:
        Line((-44, 2.9), (-29.5, 2.9))
        Line((-29.5, 2.9), (-29.5, 10))
        Line((-29.5, 10), (-24.325, 10))
        Line((-24.325, 10), (-24.325, 5))
        Line((-24.325, 5), (24.325, 5))
        Line((24.325, 5), (24.325, 10))
        Line((24.325, 10), (29.5, 10))
        Line((29.5, 10), (29.5, 2.9))
        Line((29.5, 2.9), (44, 2.9))
    split1_surface_2 = Shell.extrude(split1_surface_2_path.wire(), (0 * SPLIT1_SURFACE_2_DEPTH, 0 * SPLIT1_SURFACE_2_DEPTH, 1 * SPLIT1_SURFACE_2_DEPTH))
    split(bisect_by=split1_surface_2, keep=Keep.TOP)


solid = Compound([body_2.part, part_1.part])
